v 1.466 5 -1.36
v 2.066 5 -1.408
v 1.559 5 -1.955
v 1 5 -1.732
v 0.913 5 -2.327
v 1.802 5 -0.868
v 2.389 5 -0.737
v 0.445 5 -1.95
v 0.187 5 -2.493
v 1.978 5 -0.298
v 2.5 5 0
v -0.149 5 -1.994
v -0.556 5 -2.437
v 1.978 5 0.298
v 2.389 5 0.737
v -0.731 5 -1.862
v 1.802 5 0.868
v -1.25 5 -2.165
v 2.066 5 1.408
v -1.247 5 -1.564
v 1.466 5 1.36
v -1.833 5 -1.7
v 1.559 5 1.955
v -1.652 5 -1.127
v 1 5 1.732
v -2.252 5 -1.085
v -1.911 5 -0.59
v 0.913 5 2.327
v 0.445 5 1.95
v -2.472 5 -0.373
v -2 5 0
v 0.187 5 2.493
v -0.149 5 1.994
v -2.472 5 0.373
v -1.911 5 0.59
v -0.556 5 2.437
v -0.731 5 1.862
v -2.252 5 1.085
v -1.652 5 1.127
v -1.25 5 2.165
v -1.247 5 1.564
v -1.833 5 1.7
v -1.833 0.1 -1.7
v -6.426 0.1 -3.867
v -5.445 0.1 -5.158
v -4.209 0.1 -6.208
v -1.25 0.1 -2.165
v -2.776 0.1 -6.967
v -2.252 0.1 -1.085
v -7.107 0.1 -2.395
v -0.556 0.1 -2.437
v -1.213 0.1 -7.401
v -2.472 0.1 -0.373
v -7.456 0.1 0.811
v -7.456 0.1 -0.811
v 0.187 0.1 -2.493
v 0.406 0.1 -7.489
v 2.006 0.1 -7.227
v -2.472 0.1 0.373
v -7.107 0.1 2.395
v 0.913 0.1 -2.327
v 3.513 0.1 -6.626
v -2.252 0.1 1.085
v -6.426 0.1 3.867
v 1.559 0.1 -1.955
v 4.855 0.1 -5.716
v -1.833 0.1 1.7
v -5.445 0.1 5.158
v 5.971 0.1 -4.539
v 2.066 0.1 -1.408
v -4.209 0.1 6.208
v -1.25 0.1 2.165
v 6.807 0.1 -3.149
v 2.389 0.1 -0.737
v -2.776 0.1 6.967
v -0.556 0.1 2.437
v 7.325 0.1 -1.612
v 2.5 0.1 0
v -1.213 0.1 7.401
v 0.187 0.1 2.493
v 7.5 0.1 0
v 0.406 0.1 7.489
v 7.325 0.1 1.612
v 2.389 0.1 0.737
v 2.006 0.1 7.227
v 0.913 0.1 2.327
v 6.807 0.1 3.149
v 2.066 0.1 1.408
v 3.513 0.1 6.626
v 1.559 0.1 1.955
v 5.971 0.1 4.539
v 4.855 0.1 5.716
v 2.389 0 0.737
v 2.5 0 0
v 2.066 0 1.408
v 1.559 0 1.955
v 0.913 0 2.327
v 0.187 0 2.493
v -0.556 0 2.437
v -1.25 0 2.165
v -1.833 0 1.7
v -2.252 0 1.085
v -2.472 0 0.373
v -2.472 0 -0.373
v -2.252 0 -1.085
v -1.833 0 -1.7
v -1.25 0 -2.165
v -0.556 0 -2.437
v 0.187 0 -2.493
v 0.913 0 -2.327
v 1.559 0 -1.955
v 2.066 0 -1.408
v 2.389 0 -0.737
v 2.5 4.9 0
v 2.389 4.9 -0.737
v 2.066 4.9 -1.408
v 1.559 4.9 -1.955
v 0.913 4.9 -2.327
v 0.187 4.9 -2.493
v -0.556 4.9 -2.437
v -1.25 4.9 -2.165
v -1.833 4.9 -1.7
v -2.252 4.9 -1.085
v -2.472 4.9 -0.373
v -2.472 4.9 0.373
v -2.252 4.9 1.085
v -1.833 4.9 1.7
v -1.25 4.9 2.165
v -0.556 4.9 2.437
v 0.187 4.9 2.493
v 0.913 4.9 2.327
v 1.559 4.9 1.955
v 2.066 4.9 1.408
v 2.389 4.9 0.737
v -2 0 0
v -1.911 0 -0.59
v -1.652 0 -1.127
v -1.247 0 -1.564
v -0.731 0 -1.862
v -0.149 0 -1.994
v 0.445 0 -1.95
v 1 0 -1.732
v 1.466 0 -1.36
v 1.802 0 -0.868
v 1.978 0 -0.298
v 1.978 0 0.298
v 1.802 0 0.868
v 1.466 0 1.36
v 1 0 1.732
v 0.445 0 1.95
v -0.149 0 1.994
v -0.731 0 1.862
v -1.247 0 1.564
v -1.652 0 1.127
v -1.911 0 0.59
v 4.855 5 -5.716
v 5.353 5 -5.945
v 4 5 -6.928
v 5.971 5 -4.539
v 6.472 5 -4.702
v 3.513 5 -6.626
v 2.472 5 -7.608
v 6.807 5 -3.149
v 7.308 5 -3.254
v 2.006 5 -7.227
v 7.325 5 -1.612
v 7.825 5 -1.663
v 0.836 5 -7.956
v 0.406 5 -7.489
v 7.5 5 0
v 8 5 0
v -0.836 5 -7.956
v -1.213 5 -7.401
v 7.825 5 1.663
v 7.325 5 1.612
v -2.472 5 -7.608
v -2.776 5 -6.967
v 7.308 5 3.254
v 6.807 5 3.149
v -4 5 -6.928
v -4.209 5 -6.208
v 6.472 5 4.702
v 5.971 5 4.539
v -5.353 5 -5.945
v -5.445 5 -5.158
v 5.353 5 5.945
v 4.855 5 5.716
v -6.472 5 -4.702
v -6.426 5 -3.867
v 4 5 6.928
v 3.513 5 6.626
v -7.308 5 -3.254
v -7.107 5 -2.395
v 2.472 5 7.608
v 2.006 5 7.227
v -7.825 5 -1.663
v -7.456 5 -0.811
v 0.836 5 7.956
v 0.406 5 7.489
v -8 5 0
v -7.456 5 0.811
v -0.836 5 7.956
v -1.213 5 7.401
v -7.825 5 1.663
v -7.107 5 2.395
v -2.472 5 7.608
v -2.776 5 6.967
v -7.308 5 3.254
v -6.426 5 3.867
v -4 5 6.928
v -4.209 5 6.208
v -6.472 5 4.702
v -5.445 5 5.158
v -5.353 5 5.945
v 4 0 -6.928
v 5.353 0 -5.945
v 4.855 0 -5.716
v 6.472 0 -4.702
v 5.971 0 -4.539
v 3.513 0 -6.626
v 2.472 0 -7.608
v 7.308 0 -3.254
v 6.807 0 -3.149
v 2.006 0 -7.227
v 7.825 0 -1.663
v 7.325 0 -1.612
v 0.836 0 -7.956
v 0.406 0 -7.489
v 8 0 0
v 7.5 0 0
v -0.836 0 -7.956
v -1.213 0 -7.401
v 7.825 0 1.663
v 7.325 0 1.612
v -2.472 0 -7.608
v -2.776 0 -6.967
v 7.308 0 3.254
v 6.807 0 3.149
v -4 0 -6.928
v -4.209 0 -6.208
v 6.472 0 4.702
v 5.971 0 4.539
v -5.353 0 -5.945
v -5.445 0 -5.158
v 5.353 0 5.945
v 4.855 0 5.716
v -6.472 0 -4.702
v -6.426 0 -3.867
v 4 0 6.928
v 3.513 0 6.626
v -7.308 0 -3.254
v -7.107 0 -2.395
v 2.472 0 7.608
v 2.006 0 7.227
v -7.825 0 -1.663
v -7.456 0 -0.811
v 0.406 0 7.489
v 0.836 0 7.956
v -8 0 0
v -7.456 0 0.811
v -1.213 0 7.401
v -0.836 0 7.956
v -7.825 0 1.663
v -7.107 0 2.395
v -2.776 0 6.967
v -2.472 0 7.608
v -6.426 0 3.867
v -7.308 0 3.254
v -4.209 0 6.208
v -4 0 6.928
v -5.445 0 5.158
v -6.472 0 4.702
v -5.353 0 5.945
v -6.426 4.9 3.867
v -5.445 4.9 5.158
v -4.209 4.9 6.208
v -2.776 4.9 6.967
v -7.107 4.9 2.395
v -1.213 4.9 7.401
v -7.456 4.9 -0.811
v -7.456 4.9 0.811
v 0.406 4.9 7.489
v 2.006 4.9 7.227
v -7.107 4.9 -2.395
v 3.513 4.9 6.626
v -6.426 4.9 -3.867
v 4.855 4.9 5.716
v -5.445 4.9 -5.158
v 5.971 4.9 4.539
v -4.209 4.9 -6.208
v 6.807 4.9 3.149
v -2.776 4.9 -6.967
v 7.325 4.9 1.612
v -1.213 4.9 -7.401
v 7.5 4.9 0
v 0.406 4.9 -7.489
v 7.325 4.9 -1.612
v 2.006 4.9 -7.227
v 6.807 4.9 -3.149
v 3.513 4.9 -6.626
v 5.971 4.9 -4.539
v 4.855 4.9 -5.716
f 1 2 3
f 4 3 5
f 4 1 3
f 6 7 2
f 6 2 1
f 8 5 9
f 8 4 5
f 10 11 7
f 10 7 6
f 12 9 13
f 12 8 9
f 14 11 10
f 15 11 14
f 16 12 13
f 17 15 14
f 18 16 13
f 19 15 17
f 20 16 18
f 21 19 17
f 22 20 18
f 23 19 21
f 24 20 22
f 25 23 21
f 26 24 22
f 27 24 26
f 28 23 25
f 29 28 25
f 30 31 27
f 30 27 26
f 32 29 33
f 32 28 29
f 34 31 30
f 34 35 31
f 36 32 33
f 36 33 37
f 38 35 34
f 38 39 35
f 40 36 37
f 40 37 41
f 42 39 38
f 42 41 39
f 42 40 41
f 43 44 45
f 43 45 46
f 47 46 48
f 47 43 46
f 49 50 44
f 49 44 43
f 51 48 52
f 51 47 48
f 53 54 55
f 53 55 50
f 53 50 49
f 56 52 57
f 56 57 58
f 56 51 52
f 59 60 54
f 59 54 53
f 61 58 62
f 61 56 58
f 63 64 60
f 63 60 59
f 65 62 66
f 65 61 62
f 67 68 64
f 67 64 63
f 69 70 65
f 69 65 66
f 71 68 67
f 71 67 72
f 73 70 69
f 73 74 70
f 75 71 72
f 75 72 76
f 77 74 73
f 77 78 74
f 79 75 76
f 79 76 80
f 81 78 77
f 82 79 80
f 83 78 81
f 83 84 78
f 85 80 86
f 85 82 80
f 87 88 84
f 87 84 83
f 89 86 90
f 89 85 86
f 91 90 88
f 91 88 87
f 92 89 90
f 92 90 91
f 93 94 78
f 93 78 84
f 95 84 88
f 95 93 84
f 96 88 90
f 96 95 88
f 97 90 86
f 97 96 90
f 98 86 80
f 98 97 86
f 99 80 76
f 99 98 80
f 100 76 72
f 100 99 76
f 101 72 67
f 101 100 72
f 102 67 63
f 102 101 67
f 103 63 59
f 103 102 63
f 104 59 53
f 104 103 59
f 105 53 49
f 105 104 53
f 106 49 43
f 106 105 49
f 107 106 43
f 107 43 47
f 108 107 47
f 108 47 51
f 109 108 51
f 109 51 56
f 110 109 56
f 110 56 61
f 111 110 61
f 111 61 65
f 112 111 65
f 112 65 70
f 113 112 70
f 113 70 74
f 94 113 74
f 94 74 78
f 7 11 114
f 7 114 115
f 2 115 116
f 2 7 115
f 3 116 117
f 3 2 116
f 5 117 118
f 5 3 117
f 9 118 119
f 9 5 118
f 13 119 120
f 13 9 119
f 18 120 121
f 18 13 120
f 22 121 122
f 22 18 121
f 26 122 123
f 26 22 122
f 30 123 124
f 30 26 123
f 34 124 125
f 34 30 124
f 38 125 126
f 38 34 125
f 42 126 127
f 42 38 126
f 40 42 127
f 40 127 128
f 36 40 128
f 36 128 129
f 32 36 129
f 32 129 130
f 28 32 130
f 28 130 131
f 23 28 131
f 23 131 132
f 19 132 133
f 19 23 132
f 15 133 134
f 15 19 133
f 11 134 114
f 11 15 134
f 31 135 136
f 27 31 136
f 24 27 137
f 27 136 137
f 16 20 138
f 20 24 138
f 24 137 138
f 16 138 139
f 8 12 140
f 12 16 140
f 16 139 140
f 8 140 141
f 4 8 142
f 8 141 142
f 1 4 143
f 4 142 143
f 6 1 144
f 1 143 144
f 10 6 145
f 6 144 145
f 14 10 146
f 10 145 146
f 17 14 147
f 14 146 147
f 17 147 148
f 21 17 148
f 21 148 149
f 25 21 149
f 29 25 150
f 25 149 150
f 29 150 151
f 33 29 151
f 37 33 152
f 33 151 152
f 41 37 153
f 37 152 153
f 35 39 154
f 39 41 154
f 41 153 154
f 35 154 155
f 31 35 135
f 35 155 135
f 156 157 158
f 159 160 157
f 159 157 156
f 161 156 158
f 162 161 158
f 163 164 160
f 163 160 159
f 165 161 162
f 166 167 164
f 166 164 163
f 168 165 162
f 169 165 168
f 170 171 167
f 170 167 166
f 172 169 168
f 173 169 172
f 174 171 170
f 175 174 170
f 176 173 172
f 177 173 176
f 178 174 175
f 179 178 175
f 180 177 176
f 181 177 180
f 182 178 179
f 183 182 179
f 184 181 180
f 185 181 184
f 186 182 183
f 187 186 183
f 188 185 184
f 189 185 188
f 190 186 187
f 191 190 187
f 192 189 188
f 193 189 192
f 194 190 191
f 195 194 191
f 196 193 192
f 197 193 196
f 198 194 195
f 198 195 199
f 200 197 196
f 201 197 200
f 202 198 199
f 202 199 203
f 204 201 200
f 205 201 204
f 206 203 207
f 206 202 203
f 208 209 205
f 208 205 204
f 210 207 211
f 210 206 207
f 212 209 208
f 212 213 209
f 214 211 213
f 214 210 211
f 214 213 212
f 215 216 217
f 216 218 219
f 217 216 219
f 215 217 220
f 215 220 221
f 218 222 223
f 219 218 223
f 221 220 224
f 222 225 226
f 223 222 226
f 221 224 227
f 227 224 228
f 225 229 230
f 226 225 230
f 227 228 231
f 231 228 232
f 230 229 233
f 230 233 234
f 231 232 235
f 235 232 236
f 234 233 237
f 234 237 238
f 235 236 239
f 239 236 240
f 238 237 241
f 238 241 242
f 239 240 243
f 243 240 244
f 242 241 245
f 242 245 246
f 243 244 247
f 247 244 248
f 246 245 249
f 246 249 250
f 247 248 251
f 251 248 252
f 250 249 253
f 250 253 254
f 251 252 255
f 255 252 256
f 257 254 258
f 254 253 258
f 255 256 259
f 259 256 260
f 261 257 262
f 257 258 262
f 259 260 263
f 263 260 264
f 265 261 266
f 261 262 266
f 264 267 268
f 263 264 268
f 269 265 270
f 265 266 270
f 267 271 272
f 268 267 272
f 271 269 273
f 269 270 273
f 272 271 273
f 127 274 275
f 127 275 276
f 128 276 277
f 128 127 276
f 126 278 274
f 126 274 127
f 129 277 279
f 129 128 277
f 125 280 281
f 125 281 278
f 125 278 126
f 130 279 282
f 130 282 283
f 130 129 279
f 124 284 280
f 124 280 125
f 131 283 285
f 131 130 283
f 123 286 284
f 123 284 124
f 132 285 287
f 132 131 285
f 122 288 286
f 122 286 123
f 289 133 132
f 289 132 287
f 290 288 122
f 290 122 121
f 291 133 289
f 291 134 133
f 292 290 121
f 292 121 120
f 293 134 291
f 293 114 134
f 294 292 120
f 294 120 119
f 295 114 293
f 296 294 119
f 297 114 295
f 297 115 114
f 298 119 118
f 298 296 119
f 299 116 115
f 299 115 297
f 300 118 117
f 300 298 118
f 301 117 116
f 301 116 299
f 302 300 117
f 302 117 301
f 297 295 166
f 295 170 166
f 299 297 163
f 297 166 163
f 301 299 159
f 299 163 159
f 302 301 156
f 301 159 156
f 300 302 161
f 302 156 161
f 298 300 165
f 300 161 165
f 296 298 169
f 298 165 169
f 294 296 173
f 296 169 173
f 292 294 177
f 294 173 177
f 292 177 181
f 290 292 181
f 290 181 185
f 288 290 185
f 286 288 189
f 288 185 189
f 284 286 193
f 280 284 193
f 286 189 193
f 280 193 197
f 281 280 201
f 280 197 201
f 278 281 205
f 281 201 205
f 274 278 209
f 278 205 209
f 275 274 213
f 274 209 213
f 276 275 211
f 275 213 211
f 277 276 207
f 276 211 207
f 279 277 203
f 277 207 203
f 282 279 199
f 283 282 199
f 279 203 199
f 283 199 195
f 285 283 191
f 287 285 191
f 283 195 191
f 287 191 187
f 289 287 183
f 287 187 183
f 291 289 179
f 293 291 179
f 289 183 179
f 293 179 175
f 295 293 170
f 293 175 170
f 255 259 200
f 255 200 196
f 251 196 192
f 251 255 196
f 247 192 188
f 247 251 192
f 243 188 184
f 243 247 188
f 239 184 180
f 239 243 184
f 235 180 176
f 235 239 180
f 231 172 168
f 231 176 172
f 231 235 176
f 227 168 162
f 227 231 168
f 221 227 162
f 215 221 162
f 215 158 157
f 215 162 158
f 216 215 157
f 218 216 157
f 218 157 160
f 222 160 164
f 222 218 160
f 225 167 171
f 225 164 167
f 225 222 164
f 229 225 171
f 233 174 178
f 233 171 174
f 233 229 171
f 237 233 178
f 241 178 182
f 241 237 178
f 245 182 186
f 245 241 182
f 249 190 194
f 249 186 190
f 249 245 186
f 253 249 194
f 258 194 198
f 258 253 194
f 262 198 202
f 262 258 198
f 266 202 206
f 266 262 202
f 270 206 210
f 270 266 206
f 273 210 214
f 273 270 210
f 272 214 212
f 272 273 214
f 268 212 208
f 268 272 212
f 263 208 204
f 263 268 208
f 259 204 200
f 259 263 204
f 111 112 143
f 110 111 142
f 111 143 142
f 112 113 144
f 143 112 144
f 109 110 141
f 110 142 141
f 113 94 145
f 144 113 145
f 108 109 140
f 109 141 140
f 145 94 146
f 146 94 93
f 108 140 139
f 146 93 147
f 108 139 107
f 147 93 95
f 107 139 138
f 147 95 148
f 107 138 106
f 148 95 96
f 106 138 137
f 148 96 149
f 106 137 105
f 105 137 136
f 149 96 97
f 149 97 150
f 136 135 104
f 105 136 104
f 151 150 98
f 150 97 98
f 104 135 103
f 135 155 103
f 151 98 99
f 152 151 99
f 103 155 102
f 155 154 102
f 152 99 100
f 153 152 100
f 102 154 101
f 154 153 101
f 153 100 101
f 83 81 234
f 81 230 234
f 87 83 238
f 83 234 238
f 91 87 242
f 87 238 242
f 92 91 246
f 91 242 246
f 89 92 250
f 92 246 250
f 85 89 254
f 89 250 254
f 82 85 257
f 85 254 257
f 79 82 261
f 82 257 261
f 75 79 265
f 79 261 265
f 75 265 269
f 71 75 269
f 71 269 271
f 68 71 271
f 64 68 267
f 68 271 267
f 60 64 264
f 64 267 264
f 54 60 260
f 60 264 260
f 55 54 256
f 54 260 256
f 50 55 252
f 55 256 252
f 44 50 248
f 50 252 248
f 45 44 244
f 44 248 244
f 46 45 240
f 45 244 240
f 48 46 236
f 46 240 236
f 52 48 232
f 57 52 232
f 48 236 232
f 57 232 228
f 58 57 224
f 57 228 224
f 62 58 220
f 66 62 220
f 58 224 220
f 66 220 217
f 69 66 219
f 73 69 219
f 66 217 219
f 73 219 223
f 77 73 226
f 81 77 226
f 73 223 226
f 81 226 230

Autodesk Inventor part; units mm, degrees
ref_plane "YZ Plane" through (0, 0, 0) normal (1, 0, 0) x (0, 1, 0)
ref_plane "XZ Plane" through (0, 0, 0) normal (0, 1, 0) x (-1, 0, 0)
ref_plane "XY Plane" through (0, 0, 0) normal (0, 0, 1) x (1, 0, 0)
sketch "スケッチ1" plane through (0, 0, 0) normal (0, 1, 0) x (-1, 0, 0)
  circle A0 centre (0, 0) radius 2
  circle A1 centre (0, 0) radius 8
  dimension "d0" = 4
  dimension "d1" = 16
extrude "押し出し1" add sketch "スケッチ1" along normal blind 5
sketch "スケッチ2" plane through (0, 5, 0) normal (0, 1, 0) x (1, 0, 0)
  circle A0 centre (0, 0) radius 2.5
  circle A1 centre (0, 0) radius 7.5
  dimension "d4" = 5
  dimension "d5" = 15
extrude "押し出し2" cut sketch "スケッチ2" against normal blind 0.1
sketch "スケッチ3" plane through (0, 0, 0) normal (0, -1, 0) x (1, 0, 0)
  circle A0 centre (0, 0) radius 2.5
  circle A1 centre (0, 0) radius 7.5
  dimension "d8" = 5
  dimension "d9" = 15
extrude "押し出し3" cut sketch "スケッチ3" against normal blind 0.1
properties part number "Bearing_634zz" material "鋼、炭素鋼"
